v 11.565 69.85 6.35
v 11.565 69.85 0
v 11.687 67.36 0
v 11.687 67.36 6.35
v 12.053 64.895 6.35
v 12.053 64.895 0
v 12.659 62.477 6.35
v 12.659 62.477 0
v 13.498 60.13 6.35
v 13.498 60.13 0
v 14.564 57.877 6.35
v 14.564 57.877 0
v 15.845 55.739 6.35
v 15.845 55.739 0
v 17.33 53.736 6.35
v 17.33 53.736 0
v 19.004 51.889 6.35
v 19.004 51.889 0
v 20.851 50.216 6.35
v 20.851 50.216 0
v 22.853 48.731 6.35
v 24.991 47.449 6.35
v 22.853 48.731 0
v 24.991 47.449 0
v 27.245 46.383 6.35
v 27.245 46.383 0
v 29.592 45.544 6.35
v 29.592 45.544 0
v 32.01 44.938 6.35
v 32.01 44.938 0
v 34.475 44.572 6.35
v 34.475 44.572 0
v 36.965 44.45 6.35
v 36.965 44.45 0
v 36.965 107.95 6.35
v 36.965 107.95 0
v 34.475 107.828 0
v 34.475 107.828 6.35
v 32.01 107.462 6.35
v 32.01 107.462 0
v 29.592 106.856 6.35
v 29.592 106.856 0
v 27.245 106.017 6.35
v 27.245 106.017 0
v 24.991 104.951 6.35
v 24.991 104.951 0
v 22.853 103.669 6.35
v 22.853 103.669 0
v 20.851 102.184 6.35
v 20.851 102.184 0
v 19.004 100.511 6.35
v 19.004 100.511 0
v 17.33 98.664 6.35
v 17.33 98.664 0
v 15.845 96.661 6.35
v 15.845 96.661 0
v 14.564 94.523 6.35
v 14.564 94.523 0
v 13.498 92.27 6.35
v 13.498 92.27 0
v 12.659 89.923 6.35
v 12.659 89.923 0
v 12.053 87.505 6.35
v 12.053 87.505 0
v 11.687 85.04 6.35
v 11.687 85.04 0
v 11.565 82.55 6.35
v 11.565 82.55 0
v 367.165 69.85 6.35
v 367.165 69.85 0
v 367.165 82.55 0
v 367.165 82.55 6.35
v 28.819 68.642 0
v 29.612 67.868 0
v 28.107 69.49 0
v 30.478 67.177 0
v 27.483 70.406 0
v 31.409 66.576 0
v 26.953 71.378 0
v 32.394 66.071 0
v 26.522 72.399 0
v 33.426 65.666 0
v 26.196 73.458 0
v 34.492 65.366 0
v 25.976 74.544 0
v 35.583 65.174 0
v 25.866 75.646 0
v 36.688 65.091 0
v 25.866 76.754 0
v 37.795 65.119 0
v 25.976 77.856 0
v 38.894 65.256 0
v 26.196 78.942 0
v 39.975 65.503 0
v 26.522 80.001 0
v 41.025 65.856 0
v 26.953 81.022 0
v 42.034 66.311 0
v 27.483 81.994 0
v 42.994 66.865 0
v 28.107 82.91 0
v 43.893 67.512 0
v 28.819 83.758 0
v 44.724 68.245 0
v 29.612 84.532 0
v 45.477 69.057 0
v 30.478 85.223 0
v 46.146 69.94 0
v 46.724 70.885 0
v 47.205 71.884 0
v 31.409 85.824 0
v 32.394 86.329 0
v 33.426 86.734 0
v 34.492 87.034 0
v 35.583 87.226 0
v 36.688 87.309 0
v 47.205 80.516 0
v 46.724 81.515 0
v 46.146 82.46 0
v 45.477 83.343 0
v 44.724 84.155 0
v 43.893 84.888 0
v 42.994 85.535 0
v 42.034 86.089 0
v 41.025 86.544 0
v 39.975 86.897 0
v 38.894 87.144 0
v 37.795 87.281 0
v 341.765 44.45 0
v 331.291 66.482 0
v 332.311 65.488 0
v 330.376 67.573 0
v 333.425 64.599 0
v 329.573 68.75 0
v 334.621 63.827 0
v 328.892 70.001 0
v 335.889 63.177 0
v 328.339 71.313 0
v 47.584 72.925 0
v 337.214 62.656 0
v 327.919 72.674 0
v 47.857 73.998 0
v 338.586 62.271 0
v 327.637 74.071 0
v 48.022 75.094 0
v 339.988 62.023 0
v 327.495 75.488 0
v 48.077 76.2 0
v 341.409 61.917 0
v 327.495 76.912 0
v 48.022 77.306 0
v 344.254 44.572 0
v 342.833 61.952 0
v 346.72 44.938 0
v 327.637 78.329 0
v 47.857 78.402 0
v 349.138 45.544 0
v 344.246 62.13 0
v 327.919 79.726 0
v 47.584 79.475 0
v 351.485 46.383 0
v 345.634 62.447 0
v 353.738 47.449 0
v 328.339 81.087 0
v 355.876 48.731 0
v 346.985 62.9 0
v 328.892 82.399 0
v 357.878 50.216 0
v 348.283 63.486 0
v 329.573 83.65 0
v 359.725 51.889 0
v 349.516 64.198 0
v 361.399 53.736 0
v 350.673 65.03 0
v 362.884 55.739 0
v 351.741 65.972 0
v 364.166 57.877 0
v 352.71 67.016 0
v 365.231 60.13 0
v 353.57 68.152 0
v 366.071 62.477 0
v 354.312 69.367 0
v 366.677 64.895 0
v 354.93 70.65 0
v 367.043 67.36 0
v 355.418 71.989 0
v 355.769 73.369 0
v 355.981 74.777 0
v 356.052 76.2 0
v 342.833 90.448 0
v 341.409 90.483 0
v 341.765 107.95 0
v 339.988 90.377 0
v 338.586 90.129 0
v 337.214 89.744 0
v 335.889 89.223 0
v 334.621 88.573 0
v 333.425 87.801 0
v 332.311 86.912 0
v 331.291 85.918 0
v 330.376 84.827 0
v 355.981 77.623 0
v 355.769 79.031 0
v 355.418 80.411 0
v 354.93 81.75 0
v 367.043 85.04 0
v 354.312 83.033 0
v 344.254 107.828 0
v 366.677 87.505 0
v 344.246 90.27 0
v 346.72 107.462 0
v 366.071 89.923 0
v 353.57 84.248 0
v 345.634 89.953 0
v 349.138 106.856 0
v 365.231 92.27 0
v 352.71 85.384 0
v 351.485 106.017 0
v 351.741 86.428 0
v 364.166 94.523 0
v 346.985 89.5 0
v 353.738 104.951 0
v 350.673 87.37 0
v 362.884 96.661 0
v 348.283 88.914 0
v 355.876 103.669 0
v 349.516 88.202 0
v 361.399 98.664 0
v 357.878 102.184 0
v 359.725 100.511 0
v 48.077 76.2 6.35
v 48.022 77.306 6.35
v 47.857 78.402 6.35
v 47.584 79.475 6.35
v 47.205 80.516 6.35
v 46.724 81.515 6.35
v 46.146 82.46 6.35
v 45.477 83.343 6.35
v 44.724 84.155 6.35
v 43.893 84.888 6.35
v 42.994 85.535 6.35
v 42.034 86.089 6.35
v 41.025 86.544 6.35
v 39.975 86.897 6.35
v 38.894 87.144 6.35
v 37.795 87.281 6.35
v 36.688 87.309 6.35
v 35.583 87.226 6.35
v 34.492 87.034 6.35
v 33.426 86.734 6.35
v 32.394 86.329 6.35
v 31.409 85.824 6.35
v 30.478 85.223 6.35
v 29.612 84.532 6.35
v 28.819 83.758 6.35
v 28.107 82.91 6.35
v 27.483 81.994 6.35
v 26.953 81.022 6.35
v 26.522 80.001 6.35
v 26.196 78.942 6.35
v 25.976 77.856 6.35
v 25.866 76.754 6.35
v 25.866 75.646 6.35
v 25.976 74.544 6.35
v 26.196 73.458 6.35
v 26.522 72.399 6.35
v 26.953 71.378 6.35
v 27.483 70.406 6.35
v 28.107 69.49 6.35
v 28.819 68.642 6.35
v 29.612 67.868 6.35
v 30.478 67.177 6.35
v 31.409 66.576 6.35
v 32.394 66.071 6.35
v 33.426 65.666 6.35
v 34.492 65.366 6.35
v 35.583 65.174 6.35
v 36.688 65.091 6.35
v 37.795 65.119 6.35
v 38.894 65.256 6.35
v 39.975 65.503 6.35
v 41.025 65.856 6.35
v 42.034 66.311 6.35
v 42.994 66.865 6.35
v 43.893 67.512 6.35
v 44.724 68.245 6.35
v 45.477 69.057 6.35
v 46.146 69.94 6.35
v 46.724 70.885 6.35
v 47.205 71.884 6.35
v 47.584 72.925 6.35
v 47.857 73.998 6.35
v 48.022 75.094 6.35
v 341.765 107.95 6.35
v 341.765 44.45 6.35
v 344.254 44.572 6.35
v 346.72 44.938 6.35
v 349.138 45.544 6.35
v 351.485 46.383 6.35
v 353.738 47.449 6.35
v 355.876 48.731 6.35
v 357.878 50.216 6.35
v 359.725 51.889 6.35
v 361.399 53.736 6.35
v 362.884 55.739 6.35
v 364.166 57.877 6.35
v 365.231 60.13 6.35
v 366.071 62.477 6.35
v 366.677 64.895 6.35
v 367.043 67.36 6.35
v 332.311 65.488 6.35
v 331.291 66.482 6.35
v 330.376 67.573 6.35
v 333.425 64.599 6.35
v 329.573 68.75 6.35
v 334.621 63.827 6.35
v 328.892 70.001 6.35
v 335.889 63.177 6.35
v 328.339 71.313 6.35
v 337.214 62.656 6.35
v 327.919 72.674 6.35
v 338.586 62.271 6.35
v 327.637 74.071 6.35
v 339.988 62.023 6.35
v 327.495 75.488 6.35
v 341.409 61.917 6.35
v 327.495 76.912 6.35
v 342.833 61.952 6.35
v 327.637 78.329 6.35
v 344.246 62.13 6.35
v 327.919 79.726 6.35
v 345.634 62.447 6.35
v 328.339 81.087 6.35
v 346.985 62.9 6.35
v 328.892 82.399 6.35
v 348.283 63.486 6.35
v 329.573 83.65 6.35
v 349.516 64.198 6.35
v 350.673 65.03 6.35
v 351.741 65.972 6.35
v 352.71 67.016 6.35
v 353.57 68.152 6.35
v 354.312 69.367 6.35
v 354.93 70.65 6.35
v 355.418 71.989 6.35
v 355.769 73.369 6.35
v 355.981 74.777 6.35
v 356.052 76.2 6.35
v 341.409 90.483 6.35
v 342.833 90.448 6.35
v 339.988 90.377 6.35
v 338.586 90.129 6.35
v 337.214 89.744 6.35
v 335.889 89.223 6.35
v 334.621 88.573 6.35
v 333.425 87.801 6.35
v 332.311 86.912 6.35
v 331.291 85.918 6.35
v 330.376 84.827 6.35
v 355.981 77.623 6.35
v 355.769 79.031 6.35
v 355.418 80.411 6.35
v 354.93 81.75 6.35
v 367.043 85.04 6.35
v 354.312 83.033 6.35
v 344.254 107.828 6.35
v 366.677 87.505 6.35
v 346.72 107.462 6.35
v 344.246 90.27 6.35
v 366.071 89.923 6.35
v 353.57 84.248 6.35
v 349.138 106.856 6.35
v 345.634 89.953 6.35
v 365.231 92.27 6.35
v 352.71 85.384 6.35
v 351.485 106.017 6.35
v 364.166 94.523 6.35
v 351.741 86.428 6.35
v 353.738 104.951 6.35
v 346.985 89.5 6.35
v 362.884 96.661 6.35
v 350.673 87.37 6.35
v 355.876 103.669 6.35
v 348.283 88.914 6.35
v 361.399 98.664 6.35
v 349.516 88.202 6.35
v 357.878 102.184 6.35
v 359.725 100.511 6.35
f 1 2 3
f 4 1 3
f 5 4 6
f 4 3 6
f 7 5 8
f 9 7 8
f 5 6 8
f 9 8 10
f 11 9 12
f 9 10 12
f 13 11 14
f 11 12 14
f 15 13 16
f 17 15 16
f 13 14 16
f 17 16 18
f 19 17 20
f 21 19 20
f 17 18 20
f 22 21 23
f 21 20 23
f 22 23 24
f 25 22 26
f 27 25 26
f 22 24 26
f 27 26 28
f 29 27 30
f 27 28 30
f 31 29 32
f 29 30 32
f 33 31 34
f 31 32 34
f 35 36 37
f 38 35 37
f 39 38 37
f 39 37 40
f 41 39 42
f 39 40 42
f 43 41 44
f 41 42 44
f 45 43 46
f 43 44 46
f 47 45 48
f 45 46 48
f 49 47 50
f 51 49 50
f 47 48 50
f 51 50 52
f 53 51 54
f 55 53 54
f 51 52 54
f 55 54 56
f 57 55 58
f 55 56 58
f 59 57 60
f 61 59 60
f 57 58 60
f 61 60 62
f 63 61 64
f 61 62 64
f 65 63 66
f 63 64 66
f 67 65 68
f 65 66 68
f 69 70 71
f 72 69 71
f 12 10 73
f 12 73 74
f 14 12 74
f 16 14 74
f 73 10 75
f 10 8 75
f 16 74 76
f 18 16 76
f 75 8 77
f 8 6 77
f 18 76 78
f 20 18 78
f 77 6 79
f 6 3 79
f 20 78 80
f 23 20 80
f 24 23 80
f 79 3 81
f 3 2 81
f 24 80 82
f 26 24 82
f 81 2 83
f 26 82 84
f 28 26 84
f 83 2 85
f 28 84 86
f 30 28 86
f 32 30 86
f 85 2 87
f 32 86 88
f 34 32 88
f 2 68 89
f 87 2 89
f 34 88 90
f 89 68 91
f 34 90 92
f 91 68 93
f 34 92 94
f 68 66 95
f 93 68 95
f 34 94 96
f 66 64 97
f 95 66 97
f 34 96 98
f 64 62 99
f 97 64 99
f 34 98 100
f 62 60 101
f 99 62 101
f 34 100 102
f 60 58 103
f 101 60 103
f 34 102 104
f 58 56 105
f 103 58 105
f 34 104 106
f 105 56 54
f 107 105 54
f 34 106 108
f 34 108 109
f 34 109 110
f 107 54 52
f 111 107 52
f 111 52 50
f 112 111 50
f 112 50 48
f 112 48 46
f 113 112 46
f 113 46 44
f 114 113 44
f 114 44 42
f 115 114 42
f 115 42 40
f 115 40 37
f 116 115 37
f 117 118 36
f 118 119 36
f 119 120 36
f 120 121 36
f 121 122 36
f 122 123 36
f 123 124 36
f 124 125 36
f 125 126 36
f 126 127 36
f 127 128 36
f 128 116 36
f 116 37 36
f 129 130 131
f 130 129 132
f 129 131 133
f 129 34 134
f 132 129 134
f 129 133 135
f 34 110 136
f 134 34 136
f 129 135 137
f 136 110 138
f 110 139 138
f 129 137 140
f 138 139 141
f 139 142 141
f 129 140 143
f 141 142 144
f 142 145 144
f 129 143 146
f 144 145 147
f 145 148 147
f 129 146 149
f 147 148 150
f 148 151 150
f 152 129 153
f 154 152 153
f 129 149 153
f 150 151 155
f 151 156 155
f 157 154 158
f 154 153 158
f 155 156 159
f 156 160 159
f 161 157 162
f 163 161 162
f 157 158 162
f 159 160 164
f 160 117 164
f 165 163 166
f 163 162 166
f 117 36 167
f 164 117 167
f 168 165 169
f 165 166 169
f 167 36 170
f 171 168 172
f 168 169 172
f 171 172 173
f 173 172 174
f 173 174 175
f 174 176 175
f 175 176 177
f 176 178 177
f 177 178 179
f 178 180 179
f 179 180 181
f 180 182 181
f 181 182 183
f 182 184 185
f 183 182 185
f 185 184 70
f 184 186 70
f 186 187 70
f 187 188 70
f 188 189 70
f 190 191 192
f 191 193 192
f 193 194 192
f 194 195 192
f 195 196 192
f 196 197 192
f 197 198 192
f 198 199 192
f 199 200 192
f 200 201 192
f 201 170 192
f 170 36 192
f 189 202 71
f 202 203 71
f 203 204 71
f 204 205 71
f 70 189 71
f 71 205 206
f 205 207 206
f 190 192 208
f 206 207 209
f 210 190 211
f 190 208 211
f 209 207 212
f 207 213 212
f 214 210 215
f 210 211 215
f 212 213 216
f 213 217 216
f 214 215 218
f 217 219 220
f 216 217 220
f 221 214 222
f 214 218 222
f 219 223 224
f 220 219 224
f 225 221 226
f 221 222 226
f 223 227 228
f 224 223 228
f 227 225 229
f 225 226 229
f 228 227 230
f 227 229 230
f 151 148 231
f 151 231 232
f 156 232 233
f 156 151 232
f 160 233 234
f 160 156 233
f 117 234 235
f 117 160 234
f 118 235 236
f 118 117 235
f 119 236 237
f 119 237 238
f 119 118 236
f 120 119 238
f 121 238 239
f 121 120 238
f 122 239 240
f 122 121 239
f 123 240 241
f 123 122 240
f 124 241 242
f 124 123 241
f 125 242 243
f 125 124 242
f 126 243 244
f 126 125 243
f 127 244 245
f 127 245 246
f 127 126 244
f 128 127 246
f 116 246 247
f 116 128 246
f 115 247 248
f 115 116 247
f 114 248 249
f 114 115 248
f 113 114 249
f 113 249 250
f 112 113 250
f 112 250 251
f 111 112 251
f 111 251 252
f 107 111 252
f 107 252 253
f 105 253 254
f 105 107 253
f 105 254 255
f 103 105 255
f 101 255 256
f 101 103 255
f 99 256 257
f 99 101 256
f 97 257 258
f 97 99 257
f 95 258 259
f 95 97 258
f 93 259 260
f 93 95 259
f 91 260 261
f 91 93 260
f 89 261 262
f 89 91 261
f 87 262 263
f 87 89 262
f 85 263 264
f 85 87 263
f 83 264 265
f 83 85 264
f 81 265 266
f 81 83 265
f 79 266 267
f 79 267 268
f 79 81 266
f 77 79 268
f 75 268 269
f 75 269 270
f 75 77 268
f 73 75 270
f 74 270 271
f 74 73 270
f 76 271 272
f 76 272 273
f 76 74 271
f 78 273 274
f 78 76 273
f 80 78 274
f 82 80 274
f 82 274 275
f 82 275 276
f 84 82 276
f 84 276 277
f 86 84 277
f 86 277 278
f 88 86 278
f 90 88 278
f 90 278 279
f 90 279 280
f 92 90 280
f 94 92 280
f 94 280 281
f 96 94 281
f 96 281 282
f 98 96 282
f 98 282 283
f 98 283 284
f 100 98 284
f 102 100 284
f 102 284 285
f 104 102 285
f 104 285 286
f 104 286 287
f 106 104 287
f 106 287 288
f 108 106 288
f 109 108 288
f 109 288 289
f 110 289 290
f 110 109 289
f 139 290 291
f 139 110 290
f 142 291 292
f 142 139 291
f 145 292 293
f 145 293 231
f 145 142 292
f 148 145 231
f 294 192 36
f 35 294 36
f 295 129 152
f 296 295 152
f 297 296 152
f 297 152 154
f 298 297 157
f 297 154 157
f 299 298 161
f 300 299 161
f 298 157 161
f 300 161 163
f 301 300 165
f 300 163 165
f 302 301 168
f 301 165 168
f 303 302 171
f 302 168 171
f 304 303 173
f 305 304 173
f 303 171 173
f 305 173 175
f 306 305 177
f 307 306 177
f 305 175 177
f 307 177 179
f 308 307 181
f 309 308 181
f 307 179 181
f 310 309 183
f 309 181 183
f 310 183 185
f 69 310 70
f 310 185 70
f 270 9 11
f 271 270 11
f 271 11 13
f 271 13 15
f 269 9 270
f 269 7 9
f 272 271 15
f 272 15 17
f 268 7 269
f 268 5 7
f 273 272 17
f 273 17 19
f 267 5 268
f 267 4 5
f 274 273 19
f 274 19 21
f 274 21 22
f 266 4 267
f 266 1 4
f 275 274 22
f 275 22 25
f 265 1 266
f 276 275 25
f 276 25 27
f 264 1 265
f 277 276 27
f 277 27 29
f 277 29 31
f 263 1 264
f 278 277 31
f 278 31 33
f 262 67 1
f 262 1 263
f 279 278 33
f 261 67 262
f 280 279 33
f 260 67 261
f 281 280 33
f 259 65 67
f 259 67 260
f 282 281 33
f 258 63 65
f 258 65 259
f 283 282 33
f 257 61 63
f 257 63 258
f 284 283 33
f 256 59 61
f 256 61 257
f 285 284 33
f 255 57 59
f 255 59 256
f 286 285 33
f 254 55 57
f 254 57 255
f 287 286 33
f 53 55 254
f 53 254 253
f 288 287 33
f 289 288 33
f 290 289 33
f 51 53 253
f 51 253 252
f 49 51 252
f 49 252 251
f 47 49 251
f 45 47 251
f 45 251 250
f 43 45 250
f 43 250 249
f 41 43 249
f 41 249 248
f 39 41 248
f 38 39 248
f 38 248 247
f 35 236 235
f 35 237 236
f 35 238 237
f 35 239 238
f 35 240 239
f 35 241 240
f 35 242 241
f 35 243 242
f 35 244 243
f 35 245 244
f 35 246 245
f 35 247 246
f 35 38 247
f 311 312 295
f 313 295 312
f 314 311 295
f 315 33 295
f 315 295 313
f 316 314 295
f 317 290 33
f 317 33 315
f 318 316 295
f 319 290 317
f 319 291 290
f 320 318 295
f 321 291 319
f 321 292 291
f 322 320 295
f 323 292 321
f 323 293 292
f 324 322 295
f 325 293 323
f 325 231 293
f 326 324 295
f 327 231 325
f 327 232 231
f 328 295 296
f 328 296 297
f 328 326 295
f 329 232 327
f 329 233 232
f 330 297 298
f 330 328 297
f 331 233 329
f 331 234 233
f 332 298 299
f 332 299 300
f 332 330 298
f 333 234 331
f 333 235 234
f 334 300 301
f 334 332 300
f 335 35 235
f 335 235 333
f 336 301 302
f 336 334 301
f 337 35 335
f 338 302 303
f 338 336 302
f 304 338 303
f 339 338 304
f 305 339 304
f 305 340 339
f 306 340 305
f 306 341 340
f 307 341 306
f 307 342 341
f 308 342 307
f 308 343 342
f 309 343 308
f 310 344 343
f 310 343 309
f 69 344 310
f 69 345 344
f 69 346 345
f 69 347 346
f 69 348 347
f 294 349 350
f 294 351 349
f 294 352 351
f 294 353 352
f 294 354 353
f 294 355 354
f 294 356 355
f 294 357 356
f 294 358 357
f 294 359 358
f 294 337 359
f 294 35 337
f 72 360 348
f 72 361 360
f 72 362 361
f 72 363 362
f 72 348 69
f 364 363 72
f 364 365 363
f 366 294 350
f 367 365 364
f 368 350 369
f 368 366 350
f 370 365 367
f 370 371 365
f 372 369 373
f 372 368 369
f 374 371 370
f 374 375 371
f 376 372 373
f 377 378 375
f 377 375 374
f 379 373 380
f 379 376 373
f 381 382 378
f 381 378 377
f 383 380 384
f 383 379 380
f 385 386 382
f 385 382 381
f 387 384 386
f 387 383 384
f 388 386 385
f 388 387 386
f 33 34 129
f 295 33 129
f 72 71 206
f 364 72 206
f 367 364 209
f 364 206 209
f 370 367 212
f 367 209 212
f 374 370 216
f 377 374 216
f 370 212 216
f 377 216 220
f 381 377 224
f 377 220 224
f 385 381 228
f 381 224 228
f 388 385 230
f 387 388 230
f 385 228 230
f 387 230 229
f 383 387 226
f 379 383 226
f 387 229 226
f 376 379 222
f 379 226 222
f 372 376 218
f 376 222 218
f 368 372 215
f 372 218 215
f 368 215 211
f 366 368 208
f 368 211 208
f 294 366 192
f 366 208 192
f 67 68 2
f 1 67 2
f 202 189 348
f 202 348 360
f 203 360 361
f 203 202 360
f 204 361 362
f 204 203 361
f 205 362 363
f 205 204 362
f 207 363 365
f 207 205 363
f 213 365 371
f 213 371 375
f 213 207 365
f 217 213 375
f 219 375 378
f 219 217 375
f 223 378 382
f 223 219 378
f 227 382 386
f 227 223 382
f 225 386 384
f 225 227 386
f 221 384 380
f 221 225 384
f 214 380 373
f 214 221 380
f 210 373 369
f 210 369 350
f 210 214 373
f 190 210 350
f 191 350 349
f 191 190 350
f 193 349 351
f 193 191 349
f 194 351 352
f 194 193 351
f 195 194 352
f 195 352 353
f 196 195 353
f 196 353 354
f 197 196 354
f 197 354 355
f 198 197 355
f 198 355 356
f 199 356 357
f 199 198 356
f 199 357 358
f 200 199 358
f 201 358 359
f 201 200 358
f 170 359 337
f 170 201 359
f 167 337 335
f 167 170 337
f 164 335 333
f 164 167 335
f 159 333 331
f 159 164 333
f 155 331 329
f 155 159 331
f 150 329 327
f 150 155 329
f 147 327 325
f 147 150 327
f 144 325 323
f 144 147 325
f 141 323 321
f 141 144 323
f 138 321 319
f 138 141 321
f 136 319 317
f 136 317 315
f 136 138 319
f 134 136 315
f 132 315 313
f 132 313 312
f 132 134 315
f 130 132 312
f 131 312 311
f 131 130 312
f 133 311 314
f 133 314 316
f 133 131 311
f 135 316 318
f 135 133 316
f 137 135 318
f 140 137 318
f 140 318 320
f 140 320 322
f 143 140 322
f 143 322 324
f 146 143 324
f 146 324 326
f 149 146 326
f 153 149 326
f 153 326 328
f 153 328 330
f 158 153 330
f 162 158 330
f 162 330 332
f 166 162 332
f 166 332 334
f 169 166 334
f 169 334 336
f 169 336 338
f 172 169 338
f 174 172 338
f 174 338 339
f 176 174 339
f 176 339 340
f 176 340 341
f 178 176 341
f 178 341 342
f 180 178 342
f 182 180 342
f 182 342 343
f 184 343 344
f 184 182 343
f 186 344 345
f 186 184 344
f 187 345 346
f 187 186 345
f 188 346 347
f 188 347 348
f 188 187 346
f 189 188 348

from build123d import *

# Parameters (mm, degrees)
LAYOUT_R            = 11.1125
LAYOUT_R_2          = 14.2875
BOSS_EXTRUDE1_DEPTH = 6.35


with BuildPart() as part:
    # Layout → Boss-Extrude1 (new body)
    with BuildSketch(Plane.XY):
        with BuildLine():
            Line((36.96482124, 44.45), (341.76482124, 44.45))
            ThreePointArc((341.76482124, 44.45), (359.725333482, 51.889487758), (367.16482124, 69.85))
            Line((367.16482124, 69.85), (367.16482124, 82.55))
            ThreePointArc((367.16482124, 82.55), (359.725333482, 100.510512242), (341.76482124, 107.95))
            Line((341.76482124, 107.95), (324.969720877, 107.95))
            Line((324.969720877, 107.95), (211.92127073, 107.95))
            Line((211.92127073, 107.95), (36.96482124, 107.95))
            ThreePointArc((36.96482124, 107.95), (19.004308998, 100.510512242), (11.56482124, 82.55))
            Line((11.56482124, 82.55), (11.56482124, 69.85))
            ThreePointArc((11.56482124, 69.85), (19.004308998, 51.889487758), (36.96482124, 44.45))
        make_face()
        with Locations((36.96482124, 76.2)):
            Circle(LAYOUT_R, mode=Mode.SUBTRACT)
        with Locations((341.76482124, 76.2)):
            Circle(LAYOUT_R_2, mode=Mode.SUBTRACT)
    extrude(amount=BOSS_EXTRUDE1_DEPTH)


solid = part.part
